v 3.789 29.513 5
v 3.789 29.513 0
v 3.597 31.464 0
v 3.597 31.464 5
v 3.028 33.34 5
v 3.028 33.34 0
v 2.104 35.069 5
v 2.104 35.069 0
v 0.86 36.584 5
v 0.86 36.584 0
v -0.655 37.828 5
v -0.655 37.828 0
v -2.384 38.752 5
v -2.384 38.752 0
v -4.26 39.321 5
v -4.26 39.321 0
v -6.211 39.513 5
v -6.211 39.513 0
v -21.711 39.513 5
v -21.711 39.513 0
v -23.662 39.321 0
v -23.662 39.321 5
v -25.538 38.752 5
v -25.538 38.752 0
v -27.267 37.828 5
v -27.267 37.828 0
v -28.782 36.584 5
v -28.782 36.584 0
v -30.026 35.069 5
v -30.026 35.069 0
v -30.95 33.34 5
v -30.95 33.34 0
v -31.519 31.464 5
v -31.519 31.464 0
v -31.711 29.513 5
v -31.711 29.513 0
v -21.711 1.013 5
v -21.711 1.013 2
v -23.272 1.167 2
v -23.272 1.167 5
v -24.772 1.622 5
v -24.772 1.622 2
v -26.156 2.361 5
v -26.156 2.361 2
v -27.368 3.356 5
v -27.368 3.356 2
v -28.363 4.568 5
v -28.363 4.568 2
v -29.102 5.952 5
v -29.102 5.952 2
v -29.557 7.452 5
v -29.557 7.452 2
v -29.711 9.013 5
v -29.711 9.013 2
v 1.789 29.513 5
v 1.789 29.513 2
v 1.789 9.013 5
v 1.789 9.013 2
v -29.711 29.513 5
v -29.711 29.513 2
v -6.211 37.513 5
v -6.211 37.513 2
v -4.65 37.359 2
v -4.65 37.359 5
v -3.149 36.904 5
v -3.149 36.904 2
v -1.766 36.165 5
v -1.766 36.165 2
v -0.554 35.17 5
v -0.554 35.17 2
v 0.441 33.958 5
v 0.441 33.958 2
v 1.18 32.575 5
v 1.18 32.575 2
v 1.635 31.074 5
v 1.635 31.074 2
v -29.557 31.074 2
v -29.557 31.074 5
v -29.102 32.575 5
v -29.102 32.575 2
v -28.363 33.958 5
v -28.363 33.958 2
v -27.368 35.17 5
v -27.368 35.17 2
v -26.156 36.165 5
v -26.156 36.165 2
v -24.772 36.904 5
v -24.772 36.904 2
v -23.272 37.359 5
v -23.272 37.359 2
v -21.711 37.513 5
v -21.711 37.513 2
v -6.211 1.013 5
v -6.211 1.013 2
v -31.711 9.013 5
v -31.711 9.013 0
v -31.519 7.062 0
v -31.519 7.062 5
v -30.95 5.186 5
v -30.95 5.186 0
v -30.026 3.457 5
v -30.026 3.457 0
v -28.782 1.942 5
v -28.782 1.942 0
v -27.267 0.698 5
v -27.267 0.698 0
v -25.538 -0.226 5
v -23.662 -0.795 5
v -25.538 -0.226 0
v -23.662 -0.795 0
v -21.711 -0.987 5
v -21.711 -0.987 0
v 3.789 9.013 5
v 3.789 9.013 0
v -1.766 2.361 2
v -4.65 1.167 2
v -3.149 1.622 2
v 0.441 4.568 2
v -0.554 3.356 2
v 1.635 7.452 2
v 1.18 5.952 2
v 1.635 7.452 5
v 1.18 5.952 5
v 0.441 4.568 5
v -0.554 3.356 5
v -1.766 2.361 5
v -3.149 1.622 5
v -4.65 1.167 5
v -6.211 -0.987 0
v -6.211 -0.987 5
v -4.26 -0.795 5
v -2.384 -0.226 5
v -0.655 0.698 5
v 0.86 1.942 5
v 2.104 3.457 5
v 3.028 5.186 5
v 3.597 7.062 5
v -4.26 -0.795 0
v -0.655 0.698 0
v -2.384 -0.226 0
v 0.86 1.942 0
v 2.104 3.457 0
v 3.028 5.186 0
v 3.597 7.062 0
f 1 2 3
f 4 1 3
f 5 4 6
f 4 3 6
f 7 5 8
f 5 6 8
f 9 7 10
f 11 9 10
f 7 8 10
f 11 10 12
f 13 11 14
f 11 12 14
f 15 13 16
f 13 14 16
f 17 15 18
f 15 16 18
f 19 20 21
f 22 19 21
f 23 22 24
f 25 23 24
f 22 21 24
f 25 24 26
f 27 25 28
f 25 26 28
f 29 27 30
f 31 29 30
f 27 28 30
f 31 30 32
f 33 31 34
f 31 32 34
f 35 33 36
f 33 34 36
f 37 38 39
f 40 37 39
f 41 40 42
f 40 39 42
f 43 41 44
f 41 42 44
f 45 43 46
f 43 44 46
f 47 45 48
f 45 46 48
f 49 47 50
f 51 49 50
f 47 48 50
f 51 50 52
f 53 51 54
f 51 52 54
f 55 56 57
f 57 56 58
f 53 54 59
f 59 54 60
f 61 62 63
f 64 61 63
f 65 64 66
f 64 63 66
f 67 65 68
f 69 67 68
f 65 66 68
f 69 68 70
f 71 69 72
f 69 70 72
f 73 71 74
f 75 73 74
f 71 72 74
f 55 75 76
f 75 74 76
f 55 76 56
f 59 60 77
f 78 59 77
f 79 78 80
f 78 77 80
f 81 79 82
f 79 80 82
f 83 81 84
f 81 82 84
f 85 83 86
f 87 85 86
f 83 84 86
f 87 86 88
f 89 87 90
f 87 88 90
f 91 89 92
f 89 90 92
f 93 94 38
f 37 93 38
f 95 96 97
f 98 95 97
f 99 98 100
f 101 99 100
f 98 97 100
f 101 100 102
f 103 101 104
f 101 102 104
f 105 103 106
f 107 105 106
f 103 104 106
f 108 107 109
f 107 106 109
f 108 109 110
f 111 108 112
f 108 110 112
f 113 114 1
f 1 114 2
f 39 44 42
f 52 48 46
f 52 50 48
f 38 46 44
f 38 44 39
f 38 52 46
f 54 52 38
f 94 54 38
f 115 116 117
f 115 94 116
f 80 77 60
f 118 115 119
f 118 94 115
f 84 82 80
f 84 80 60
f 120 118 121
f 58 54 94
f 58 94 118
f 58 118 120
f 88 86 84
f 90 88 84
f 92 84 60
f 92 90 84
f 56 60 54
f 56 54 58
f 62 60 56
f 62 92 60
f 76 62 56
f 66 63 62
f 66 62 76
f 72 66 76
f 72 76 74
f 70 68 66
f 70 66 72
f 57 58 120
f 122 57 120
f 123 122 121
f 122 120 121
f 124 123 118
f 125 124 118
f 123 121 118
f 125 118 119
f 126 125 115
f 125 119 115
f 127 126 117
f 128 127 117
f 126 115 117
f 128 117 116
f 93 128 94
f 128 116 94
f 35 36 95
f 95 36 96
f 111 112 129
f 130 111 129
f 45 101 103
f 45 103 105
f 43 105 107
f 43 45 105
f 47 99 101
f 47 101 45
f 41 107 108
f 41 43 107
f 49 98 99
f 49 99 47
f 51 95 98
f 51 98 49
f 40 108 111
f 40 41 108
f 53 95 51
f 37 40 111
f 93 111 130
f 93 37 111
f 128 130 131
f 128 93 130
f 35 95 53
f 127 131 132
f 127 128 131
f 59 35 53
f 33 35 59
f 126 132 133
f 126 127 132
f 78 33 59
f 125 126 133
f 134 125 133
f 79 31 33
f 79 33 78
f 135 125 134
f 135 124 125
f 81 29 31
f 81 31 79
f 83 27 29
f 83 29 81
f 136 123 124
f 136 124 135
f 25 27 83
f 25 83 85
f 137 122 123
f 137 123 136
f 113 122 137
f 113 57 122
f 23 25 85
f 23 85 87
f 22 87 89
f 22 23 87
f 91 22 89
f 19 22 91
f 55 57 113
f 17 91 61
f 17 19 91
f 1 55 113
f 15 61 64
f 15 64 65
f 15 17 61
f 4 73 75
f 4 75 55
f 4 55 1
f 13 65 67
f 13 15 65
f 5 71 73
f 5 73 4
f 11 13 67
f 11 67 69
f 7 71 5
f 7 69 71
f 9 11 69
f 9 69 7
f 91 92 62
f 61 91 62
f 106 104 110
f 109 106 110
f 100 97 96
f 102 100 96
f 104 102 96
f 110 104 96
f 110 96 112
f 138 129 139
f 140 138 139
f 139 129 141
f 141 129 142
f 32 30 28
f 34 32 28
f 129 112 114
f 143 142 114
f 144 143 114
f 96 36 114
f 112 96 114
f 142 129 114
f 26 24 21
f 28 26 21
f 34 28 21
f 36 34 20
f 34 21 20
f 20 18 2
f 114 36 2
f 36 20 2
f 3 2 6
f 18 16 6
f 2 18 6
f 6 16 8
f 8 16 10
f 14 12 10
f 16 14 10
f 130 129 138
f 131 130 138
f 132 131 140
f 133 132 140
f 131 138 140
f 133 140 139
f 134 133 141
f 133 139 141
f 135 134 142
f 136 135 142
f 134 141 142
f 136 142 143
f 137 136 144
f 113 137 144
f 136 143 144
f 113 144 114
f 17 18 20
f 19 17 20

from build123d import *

# Parameters (mm, degrees)
F1_DEPTH = 2
F2_DEPTH = 5


with BuildPart() as f1:
    # F0 (on Top) → F1 (new body)
    with BuildSketch(Plane.XY):
        with BuildLine():
            Line((-21.71096, -0.986954), (-6.21096, -0.986954))
            ThreePointArc((-6.21096, -0.986954), (0.860108, 1.941978), (3.78904, 9.013046))
            Line((3.78904, 9.013046), (3.78904, 29.513046))
            ThreePointArc((3.78904, 29.513046), (0.860108, 36.584114), (-6.21096, 39.513046))
            Line((-6.21096, 39.513046), (-21.71096, 39.513046))
            ThreePointArc((-21.71096, 39.513046), (-28.782028, 36.584114), (-31.71096, 29.513046))
            Line((-31.71096, 29.513046), (-31.71096, 9.013046))
            ThreePointArc((-31.71096, 9.013046), (-28.782028, 1.941978), (-21.71096, -0.986954))
        make_face()
        with BuildLine():
            ThreePointArc((1.78904, 9.013046), (-0.554106, 3.356191), (-6.21096, 1.013046))
            Line((-6.21096, 1.013046), (-21.71096, 1.013046))
            ThreePointArc((-21.71096, 1.013046), (-27.367814, 3.356191), (-29.71096, 9.013046))
            Line((-29.71096, 9.013046), (-29.71096, 29.513046))
            ThreePointArc((-29.71096, 29.513046), (-27.367814, 35.1699), (-21.71096, 37.513046))
            Line((-21.71096, 37.513046), (-6.21096, 37.513046))
            ThreePointArc((-6.21096, 37.513046), (-0.554106, 35.1699), (1.78904, 29.513046))
            Line((1.78904, 29.513046), (1.78904, 9.013046))
        make_face(mode=Mode.SUBTRACT)
        with BuildLine():
            Line((-21.71096, 1.013046), (-6.21096, 1.013046))
            ThreePointArc((-6.21096, 1.013046), (-0.554106, 3.356191), (1.78904, 9.013046))
            Line((1.78904, 9.013046), (1.78904, 29.513046))
            ThreePointArc((1.78904, 29.513046), (-0.554106, 35.1699), (-6.21096, 37.513046))
            Line((-6.21096, 37.513046), (-21.71096, 37.513046))
            ThreePointArc((-21.71096, 37.513046), (-27.367814, 35.1699), (-29.71096, 29.513046))
            Line((-29.71096, 29.513046), (-29.71096, 9.013046))
            ThreePointArc((-29.71096, 9.013046), (-27.367814, 3.356191), (-21.71096, 1.013046))
        make_face()
    extrude(amount=F1_DEPTH)

    # F0 (on Top) → F2 (join)
    with BuildSketch(Plane.XY):
        with BuildLine():
            Line((-21.71096, -0.986954), (-6.21096, -0.986954))
            ThreePointArc((-6.21096, -0.986954), (0.860108, 1.941978), (3.78904, 9.013046))
            Line((3.78904, 9.013046), (3.78904, 29.513046))
            ThreePointArc((3.78904, 29.513046), (0.860108, 36.584114), (-6.21096, 39.513046))
            Line((-6.21096, 39.513046), (-21.71096, 39.513046))
            ThreePointArc((-21.71096, 39.513046), (-28.782028, 36.584114), (-31.71096, 29.513046))
            Line((-31.71096, 29.513046), (-31.71096, 9.013046))
            ThreePointArc((-31.71096, 9.013046), (-28.782028, 1.941978), (-21.71096, -0.986954))
        make_face()
        with BuildLine():
            ThreePointArc((1.78904, 9.013046), (-0.554106, 3.356191), (-6.21096, 1.013046))
            Line((-6.21096, 1.013046), (-21.71096, 1.013046))
            ThreePointArc((-21.71096, 1.013046), (-27.367814, 3.356191), (-29.71096, 9.013046))
            Line((-29.71096, 9.013046), (-29.71096, 29.513046))
            ThreePointArc((-29.71096, 29.513046), (-27.367814, 35.1699), (-21.71096, 37.513046))
            Line((-21.71096, 37.513046), (-6.21096, 37.513046))
            ThreePointArc((-6.21096, 37.513046), (-0.554106, 35.1699), (1.78904, 29.513046))
            Line((1.78904, 29.513046), (1.78904, 9.013046))
        make_face(mode=Mode.SUBTRACT)
    extrude(amount=F2_DEPTH)


solid = f1.part
